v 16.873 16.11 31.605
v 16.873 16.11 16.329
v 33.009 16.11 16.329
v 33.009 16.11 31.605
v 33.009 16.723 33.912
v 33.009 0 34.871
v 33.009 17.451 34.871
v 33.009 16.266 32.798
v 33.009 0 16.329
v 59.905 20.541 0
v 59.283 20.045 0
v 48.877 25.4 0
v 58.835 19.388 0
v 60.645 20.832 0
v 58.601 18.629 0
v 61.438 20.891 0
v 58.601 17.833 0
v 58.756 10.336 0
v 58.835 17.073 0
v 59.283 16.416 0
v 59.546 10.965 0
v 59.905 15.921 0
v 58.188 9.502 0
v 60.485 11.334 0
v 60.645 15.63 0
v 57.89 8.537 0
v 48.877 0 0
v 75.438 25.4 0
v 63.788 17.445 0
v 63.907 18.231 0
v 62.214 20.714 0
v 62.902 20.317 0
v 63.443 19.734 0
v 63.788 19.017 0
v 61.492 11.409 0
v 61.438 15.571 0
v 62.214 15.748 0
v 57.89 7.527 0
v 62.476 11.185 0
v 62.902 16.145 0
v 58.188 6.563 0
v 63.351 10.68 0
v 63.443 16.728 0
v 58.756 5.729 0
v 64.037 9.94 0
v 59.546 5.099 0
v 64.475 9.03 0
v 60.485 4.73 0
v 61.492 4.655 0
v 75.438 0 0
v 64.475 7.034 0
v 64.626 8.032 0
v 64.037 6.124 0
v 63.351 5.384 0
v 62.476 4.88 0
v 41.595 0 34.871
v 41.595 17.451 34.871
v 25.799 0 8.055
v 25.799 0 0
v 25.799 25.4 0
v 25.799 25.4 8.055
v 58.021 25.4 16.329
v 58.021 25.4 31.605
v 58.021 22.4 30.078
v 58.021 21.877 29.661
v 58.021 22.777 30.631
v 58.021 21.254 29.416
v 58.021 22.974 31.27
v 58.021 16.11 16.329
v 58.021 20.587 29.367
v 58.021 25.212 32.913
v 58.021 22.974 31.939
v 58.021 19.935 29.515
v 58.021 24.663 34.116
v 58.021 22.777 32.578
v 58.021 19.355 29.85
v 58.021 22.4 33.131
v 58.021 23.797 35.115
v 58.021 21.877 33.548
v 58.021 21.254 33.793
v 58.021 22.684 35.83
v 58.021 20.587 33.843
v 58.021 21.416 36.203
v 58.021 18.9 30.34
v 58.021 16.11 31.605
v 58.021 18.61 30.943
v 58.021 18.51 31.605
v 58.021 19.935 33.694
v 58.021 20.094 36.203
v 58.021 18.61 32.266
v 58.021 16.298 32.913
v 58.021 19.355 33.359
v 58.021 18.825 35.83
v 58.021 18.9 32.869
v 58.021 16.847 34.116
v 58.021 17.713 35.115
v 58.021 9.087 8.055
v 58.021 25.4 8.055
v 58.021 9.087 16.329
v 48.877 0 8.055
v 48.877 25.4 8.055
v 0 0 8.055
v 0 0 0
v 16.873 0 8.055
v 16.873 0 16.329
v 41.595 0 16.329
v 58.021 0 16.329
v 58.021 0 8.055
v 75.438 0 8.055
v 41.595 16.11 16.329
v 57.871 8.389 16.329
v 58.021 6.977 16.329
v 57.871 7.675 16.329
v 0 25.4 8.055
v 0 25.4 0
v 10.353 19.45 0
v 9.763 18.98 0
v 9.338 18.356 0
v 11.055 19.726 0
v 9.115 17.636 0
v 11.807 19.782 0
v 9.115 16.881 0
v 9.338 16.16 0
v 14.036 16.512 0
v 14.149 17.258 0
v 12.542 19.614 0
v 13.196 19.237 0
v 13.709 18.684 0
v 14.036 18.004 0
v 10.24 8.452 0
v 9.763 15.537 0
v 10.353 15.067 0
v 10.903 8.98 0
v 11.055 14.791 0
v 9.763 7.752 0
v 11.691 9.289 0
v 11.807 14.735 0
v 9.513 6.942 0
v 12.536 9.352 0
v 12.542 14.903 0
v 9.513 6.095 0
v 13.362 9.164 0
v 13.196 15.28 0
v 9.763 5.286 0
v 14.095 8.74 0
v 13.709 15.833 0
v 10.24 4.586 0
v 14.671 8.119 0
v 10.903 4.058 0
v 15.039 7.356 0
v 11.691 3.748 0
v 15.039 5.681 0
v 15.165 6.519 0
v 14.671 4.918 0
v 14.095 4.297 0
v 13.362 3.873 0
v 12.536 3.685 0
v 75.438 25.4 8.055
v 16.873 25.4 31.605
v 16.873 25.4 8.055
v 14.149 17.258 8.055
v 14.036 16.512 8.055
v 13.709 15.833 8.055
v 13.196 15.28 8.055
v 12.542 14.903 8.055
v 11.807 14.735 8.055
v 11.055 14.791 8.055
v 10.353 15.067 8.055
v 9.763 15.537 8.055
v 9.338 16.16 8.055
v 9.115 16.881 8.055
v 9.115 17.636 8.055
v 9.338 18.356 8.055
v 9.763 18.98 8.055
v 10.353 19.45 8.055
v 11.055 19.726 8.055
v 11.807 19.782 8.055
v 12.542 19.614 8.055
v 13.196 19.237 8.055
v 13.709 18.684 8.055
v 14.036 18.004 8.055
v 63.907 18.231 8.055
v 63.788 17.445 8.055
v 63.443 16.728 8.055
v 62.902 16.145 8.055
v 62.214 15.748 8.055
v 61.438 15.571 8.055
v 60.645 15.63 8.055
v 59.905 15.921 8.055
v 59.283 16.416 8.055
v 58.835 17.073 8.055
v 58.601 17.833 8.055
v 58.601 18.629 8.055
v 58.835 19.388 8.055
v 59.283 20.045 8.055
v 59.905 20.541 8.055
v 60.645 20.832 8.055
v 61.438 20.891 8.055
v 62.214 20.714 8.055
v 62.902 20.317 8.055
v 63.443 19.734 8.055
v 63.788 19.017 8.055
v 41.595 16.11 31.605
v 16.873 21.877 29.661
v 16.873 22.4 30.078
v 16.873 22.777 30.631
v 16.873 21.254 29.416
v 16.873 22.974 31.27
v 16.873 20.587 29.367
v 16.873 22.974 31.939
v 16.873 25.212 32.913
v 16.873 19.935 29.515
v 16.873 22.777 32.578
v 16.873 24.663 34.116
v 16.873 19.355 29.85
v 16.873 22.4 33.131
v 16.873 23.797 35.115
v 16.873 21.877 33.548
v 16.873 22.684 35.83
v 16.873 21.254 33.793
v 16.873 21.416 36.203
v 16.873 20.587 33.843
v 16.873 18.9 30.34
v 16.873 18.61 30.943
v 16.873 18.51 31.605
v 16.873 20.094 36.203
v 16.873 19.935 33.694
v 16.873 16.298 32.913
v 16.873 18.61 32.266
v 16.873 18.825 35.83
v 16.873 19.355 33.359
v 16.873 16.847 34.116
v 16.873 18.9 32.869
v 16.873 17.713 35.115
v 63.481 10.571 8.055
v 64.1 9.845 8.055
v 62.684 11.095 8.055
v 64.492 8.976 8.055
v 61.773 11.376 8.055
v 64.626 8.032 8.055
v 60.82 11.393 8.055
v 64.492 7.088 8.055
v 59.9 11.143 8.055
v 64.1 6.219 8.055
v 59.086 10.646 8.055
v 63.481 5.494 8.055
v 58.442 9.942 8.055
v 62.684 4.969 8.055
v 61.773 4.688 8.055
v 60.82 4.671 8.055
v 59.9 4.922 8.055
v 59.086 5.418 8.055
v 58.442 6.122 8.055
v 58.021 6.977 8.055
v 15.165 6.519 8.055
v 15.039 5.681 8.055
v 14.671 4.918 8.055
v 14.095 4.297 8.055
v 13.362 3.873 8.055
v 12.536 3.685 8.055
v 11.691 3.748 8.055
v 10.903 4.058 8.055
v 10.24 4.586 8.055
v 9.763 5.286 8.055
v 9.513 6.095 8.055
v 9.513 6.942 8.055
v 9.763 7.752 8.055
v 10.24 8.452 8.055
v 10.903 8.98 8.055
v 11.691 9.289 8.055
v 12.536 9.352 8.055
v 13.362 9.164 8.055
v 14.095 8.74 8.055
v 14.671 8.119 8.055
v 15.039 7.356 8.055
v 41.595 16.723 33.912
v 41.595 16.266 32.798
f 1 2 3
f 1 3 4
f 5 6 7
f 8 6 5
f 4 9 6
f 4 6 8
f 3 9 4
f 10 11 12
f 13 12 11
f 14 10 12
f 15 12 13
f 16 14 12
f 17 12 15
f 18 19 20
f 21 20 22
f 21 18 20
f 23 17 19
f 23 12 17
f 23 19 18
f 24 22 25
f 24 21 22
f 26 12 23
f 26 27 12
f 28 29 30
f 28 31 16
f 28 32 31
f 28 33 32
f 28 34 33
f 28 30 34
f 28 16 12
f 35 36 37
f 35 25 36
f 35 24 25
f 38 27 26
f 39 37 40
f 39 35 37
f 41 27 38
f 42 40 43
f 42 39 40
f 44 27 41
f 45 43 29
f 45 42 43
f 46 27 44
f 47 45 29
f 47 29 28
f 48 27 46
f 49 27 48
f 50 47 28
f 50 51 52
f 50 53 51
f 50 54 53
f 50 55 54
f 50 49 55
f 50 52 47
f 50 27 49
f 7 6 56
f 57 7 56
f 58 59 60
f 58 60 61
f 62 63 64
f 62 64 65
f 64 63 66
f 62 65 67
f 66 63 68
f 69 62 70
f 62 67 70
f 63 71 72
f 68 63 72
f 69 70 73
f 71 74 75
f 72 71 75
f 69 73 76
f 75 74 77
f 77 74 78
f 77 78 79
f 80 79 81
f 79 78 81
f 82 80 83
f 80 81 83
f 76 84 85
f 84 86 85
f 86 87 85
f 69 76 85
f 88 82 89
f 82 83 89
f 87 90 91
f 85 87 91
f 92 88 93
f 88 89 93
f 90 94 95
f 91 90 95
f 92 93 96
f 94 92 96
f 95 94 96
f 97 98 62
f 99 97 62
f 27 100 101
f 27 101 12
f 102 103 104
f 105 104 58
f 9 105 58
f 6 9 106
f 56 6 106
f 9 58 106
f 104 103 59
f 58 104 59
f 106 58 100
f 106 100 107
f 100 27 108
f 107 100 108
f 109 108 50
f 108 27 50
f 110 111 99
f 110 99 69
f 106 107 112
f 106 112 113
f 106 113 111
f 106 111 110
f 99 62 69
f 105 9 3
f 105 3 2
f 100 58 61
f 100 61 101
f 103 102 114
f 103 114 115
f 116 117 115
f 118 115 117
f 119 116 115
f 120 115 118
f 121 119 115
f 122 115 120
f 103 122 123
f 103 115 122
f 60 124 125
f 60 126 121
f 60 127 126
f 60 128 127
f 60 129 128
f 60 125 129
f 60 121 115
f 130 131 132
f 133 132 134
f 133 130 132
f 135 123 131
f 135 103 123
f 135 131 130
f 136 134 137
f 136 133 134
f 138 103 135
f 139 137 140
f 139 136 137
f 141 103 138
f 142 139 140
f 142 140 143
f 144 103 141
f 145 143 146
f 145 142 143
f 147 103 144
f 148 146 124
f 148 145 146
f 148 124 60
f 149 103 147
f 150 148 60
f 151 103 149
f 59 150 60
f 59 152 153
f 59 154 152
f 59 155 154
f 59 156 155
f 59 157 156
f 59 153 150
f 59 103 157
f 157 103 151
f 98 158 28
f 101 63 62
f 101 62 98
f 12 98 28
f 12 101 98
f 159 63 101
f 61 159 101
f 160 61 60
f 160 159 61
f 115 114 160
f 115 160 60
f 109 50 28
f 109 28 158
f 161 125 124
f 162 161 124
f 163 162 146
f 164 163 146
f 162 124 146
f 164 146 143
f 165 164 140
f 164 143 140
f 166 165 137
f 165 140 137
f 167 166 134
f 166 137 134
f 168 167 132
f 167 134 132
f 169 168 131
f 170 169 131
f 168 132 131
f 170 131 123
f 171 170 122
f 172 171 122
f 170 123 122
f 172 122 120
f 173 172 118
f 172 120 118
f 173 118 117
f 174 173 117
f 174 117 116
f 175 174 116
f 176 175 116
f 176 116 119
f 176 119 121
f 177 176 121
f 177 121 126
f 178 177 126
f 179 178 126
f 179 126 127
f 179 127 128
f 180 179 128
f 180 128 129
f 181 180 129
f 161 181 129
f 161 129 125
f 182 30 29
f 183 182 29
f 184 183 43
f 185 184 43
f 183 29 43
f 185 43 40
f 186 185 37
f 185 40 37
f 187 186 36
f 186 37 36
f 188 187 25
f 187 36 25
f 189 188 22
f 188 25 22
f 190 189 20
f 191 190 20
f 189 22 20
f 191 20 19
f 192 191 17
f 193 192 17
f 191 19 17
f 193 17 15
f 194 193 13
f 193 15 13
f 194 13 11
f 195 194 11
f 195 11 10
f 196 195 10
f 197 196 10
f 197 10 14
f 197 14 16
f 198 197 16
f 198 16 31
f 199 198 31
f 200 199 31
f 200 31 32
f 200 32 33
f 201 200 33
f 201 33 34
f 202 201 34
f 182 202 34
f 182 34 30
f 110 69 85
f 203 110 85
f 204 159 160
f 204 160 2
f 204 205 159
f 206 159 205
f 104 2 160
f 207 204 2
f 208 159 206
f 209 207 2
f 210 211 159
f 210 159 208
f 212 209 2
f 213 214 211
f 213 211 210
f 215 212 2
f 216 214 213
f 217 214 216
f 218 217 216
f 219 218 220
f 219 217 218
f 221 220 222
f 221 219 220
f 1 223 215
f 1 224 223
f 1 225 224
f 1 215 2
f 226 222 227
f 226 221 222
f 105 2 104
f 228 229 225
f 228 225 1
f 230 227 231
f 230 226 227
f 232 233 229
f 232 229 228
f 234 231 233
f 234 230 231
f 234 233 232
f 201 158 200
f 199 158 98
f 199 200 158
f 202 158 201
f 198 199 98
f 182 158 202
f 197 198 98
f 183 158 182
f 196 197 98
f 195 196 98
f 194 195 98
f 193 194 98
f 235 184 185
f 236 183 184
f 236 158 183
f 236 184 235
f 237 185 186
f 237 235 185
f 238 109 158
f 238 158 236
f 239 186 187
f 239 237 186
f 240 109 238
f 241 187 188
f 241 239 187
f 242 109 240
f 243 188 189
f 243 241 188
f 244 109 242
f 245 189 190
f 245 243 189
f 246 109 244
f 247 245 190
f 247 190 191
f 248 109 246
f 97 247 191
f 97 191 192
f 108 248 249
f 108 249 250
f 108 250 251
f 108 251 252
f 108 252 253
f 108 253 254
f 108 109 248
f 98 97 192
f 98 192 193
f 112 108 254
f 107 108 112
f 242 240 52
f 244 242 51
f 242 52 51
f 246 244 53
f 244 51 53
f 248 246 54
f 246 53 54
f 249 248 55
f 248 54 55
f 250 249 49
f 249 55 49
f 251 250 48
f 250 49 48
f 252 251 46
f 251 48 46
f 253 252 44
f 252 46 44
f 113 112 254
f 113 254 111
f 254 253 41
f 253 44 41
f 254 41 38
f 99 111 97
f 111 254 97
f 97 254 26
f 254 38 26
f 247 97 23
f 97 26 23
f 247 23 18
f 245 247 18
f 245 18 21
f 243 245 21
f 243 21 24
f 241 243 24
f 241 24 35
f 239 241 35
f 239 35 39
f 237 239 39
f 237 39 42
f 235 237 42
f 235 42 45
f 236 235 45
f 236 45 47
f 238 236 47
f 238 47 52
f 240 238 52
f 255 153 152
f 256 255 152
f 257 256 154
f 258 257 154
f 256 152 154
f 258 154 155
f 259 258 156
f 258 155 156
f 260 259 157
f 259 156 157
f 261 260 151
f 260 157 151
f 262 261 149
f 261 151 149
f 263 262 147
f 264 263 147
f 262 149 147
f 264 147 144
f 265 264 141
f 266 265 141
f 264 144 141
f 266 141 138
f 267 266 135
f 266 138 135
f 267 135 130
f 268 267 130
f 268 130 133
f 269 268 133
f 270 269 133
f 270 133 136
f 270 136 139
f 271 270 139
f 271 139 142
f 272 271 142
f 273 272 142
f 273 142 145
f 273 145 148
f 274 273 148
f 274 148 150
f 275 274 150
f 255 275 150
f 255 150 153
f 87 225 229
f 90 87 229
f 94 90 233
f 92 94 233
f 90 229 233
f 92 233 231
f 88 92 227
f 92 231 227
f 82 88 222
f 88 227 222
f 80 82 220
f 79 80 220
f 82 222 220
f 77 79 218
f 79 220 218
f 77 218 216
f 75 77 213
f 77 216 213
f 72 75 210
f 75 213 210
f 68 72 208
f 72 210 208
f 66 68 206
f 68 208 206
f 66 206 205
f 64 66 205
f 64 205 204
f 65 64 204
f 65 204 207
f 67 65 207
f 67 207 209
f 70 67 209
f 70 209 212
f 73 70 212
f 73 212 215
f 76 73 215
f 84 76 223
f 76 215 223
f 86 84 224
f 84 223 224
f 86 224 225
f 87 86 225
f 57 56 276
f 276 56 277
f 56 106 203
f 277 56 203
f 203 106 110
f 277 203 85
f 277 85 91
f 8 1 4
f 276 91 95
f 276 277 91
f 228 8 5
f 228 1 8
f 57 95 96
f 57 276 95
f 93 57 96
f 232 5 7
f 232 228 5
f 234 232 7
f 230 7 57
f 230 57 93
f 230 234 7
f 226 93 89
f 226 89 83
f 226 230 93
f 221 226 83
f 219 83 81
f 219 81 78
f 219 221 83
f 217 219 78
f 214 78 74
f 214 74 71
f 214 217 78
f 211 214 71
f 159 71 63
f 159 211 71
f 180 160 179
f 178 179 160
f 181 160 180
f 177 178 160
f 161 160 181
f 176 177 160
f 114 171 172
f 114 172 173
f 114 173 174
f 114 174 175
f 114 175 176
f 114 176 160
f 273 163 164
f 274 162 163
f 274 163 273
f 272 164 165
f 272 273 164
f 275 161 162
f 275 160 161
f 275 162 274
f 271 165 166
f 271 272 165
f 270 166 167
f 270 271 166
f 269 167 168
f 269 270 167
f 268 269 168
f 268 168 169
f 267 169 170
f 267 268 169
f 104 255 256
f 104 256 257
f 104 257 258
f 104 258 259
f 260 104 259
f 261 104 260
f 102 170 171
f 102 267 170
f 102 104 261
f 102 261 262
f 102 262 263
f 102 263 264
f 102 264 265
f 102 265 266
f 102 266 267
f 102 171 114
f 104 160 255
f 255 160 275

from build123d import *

# Parameters (mm, degrees)
F1_DEPTH = 25.4
F2_R     = 2.841654
F2_R_2   = 2.530663
F2_R_3   = 3.386715
F2_R_4   = 2.667783
F3_DEPTH = 25.4
F4_R     = 2.244401
F5_DEPTH = 41.148
F6_W     = 8.585986
F6_H     = 17.454494
F7_DEPTH = 18.542


with BuildPart() as f1:
    # F0 (on Front) → F1 (new body)
    with BuildSketch(Plane.XZ):
        Polygon((0, 8.055429), (0, 0), (25.799144, 0), (25.799144, 8.055429), (48.876859, 8.055429), (48.876859, 0), (75.438, 0), (75.438, 8.055429), (58.02086, 8.055429), (58.02086, 16.328571), (16.872857, 16.328571), (16.872857, 8.055429), align=None)
    extrude(amount=-F1_DEPTH)

    # F2 (on face) → F3 (cut)
    with BuildSketch(Plane(origin=(0, 0, 0), x_dir=(1, 0, 0), z_dir=(0, 0, -1))):
        with Locations((12.32334, -6.5187)):
            Circle(F2_R)
        with Locations((11.617891, -17.25835)):
            Circle(F2_R_2)
        with Locations((61.239045, -8.03216)):
            Circle(F2_R_3)
        with Locations((61.239045, -18.230911)):
            Circle(F2_R_4)
    extrude(amount=-F3_DEPTH, mode=Mode.SUBTRACT)

    # F4 (on face) → F5 (join)
    with BuildSketch(Plane(origin=(16.872857, 0, 0), x_dir=(0, -1, 0), z_dir=(-1, 0, 0))):
        with BuildLine():
            Line((-25.4, 31.604629), (-25.4, 16.328571))
            Line((-25.4, 16.328571), (-16.109549, 16.328571))
            Line((-16.109549, 16.328571), (-16.109549, 31.604629))
            ThreePointArc((-16.109549, 31.604629), (-20.754774, 36.249855), (-25.4, 31.604629))
        make_face()
        with Locations((-20.754774, 31.604629)):
            Circle(F4_R, mode=Mode.SUBTRACT)
    extrude(amount=-F5_DEPTH)

    # F6 (on face) → F7 (join)
    with BuildSketch(Plane.XY.offset(16.328571)):
        with Locations((37.301889, 8.727247)):
            Rectangle(F6_W, F6_H)
    extrude(amount=F7_DEPTH)


solid = f1.part
